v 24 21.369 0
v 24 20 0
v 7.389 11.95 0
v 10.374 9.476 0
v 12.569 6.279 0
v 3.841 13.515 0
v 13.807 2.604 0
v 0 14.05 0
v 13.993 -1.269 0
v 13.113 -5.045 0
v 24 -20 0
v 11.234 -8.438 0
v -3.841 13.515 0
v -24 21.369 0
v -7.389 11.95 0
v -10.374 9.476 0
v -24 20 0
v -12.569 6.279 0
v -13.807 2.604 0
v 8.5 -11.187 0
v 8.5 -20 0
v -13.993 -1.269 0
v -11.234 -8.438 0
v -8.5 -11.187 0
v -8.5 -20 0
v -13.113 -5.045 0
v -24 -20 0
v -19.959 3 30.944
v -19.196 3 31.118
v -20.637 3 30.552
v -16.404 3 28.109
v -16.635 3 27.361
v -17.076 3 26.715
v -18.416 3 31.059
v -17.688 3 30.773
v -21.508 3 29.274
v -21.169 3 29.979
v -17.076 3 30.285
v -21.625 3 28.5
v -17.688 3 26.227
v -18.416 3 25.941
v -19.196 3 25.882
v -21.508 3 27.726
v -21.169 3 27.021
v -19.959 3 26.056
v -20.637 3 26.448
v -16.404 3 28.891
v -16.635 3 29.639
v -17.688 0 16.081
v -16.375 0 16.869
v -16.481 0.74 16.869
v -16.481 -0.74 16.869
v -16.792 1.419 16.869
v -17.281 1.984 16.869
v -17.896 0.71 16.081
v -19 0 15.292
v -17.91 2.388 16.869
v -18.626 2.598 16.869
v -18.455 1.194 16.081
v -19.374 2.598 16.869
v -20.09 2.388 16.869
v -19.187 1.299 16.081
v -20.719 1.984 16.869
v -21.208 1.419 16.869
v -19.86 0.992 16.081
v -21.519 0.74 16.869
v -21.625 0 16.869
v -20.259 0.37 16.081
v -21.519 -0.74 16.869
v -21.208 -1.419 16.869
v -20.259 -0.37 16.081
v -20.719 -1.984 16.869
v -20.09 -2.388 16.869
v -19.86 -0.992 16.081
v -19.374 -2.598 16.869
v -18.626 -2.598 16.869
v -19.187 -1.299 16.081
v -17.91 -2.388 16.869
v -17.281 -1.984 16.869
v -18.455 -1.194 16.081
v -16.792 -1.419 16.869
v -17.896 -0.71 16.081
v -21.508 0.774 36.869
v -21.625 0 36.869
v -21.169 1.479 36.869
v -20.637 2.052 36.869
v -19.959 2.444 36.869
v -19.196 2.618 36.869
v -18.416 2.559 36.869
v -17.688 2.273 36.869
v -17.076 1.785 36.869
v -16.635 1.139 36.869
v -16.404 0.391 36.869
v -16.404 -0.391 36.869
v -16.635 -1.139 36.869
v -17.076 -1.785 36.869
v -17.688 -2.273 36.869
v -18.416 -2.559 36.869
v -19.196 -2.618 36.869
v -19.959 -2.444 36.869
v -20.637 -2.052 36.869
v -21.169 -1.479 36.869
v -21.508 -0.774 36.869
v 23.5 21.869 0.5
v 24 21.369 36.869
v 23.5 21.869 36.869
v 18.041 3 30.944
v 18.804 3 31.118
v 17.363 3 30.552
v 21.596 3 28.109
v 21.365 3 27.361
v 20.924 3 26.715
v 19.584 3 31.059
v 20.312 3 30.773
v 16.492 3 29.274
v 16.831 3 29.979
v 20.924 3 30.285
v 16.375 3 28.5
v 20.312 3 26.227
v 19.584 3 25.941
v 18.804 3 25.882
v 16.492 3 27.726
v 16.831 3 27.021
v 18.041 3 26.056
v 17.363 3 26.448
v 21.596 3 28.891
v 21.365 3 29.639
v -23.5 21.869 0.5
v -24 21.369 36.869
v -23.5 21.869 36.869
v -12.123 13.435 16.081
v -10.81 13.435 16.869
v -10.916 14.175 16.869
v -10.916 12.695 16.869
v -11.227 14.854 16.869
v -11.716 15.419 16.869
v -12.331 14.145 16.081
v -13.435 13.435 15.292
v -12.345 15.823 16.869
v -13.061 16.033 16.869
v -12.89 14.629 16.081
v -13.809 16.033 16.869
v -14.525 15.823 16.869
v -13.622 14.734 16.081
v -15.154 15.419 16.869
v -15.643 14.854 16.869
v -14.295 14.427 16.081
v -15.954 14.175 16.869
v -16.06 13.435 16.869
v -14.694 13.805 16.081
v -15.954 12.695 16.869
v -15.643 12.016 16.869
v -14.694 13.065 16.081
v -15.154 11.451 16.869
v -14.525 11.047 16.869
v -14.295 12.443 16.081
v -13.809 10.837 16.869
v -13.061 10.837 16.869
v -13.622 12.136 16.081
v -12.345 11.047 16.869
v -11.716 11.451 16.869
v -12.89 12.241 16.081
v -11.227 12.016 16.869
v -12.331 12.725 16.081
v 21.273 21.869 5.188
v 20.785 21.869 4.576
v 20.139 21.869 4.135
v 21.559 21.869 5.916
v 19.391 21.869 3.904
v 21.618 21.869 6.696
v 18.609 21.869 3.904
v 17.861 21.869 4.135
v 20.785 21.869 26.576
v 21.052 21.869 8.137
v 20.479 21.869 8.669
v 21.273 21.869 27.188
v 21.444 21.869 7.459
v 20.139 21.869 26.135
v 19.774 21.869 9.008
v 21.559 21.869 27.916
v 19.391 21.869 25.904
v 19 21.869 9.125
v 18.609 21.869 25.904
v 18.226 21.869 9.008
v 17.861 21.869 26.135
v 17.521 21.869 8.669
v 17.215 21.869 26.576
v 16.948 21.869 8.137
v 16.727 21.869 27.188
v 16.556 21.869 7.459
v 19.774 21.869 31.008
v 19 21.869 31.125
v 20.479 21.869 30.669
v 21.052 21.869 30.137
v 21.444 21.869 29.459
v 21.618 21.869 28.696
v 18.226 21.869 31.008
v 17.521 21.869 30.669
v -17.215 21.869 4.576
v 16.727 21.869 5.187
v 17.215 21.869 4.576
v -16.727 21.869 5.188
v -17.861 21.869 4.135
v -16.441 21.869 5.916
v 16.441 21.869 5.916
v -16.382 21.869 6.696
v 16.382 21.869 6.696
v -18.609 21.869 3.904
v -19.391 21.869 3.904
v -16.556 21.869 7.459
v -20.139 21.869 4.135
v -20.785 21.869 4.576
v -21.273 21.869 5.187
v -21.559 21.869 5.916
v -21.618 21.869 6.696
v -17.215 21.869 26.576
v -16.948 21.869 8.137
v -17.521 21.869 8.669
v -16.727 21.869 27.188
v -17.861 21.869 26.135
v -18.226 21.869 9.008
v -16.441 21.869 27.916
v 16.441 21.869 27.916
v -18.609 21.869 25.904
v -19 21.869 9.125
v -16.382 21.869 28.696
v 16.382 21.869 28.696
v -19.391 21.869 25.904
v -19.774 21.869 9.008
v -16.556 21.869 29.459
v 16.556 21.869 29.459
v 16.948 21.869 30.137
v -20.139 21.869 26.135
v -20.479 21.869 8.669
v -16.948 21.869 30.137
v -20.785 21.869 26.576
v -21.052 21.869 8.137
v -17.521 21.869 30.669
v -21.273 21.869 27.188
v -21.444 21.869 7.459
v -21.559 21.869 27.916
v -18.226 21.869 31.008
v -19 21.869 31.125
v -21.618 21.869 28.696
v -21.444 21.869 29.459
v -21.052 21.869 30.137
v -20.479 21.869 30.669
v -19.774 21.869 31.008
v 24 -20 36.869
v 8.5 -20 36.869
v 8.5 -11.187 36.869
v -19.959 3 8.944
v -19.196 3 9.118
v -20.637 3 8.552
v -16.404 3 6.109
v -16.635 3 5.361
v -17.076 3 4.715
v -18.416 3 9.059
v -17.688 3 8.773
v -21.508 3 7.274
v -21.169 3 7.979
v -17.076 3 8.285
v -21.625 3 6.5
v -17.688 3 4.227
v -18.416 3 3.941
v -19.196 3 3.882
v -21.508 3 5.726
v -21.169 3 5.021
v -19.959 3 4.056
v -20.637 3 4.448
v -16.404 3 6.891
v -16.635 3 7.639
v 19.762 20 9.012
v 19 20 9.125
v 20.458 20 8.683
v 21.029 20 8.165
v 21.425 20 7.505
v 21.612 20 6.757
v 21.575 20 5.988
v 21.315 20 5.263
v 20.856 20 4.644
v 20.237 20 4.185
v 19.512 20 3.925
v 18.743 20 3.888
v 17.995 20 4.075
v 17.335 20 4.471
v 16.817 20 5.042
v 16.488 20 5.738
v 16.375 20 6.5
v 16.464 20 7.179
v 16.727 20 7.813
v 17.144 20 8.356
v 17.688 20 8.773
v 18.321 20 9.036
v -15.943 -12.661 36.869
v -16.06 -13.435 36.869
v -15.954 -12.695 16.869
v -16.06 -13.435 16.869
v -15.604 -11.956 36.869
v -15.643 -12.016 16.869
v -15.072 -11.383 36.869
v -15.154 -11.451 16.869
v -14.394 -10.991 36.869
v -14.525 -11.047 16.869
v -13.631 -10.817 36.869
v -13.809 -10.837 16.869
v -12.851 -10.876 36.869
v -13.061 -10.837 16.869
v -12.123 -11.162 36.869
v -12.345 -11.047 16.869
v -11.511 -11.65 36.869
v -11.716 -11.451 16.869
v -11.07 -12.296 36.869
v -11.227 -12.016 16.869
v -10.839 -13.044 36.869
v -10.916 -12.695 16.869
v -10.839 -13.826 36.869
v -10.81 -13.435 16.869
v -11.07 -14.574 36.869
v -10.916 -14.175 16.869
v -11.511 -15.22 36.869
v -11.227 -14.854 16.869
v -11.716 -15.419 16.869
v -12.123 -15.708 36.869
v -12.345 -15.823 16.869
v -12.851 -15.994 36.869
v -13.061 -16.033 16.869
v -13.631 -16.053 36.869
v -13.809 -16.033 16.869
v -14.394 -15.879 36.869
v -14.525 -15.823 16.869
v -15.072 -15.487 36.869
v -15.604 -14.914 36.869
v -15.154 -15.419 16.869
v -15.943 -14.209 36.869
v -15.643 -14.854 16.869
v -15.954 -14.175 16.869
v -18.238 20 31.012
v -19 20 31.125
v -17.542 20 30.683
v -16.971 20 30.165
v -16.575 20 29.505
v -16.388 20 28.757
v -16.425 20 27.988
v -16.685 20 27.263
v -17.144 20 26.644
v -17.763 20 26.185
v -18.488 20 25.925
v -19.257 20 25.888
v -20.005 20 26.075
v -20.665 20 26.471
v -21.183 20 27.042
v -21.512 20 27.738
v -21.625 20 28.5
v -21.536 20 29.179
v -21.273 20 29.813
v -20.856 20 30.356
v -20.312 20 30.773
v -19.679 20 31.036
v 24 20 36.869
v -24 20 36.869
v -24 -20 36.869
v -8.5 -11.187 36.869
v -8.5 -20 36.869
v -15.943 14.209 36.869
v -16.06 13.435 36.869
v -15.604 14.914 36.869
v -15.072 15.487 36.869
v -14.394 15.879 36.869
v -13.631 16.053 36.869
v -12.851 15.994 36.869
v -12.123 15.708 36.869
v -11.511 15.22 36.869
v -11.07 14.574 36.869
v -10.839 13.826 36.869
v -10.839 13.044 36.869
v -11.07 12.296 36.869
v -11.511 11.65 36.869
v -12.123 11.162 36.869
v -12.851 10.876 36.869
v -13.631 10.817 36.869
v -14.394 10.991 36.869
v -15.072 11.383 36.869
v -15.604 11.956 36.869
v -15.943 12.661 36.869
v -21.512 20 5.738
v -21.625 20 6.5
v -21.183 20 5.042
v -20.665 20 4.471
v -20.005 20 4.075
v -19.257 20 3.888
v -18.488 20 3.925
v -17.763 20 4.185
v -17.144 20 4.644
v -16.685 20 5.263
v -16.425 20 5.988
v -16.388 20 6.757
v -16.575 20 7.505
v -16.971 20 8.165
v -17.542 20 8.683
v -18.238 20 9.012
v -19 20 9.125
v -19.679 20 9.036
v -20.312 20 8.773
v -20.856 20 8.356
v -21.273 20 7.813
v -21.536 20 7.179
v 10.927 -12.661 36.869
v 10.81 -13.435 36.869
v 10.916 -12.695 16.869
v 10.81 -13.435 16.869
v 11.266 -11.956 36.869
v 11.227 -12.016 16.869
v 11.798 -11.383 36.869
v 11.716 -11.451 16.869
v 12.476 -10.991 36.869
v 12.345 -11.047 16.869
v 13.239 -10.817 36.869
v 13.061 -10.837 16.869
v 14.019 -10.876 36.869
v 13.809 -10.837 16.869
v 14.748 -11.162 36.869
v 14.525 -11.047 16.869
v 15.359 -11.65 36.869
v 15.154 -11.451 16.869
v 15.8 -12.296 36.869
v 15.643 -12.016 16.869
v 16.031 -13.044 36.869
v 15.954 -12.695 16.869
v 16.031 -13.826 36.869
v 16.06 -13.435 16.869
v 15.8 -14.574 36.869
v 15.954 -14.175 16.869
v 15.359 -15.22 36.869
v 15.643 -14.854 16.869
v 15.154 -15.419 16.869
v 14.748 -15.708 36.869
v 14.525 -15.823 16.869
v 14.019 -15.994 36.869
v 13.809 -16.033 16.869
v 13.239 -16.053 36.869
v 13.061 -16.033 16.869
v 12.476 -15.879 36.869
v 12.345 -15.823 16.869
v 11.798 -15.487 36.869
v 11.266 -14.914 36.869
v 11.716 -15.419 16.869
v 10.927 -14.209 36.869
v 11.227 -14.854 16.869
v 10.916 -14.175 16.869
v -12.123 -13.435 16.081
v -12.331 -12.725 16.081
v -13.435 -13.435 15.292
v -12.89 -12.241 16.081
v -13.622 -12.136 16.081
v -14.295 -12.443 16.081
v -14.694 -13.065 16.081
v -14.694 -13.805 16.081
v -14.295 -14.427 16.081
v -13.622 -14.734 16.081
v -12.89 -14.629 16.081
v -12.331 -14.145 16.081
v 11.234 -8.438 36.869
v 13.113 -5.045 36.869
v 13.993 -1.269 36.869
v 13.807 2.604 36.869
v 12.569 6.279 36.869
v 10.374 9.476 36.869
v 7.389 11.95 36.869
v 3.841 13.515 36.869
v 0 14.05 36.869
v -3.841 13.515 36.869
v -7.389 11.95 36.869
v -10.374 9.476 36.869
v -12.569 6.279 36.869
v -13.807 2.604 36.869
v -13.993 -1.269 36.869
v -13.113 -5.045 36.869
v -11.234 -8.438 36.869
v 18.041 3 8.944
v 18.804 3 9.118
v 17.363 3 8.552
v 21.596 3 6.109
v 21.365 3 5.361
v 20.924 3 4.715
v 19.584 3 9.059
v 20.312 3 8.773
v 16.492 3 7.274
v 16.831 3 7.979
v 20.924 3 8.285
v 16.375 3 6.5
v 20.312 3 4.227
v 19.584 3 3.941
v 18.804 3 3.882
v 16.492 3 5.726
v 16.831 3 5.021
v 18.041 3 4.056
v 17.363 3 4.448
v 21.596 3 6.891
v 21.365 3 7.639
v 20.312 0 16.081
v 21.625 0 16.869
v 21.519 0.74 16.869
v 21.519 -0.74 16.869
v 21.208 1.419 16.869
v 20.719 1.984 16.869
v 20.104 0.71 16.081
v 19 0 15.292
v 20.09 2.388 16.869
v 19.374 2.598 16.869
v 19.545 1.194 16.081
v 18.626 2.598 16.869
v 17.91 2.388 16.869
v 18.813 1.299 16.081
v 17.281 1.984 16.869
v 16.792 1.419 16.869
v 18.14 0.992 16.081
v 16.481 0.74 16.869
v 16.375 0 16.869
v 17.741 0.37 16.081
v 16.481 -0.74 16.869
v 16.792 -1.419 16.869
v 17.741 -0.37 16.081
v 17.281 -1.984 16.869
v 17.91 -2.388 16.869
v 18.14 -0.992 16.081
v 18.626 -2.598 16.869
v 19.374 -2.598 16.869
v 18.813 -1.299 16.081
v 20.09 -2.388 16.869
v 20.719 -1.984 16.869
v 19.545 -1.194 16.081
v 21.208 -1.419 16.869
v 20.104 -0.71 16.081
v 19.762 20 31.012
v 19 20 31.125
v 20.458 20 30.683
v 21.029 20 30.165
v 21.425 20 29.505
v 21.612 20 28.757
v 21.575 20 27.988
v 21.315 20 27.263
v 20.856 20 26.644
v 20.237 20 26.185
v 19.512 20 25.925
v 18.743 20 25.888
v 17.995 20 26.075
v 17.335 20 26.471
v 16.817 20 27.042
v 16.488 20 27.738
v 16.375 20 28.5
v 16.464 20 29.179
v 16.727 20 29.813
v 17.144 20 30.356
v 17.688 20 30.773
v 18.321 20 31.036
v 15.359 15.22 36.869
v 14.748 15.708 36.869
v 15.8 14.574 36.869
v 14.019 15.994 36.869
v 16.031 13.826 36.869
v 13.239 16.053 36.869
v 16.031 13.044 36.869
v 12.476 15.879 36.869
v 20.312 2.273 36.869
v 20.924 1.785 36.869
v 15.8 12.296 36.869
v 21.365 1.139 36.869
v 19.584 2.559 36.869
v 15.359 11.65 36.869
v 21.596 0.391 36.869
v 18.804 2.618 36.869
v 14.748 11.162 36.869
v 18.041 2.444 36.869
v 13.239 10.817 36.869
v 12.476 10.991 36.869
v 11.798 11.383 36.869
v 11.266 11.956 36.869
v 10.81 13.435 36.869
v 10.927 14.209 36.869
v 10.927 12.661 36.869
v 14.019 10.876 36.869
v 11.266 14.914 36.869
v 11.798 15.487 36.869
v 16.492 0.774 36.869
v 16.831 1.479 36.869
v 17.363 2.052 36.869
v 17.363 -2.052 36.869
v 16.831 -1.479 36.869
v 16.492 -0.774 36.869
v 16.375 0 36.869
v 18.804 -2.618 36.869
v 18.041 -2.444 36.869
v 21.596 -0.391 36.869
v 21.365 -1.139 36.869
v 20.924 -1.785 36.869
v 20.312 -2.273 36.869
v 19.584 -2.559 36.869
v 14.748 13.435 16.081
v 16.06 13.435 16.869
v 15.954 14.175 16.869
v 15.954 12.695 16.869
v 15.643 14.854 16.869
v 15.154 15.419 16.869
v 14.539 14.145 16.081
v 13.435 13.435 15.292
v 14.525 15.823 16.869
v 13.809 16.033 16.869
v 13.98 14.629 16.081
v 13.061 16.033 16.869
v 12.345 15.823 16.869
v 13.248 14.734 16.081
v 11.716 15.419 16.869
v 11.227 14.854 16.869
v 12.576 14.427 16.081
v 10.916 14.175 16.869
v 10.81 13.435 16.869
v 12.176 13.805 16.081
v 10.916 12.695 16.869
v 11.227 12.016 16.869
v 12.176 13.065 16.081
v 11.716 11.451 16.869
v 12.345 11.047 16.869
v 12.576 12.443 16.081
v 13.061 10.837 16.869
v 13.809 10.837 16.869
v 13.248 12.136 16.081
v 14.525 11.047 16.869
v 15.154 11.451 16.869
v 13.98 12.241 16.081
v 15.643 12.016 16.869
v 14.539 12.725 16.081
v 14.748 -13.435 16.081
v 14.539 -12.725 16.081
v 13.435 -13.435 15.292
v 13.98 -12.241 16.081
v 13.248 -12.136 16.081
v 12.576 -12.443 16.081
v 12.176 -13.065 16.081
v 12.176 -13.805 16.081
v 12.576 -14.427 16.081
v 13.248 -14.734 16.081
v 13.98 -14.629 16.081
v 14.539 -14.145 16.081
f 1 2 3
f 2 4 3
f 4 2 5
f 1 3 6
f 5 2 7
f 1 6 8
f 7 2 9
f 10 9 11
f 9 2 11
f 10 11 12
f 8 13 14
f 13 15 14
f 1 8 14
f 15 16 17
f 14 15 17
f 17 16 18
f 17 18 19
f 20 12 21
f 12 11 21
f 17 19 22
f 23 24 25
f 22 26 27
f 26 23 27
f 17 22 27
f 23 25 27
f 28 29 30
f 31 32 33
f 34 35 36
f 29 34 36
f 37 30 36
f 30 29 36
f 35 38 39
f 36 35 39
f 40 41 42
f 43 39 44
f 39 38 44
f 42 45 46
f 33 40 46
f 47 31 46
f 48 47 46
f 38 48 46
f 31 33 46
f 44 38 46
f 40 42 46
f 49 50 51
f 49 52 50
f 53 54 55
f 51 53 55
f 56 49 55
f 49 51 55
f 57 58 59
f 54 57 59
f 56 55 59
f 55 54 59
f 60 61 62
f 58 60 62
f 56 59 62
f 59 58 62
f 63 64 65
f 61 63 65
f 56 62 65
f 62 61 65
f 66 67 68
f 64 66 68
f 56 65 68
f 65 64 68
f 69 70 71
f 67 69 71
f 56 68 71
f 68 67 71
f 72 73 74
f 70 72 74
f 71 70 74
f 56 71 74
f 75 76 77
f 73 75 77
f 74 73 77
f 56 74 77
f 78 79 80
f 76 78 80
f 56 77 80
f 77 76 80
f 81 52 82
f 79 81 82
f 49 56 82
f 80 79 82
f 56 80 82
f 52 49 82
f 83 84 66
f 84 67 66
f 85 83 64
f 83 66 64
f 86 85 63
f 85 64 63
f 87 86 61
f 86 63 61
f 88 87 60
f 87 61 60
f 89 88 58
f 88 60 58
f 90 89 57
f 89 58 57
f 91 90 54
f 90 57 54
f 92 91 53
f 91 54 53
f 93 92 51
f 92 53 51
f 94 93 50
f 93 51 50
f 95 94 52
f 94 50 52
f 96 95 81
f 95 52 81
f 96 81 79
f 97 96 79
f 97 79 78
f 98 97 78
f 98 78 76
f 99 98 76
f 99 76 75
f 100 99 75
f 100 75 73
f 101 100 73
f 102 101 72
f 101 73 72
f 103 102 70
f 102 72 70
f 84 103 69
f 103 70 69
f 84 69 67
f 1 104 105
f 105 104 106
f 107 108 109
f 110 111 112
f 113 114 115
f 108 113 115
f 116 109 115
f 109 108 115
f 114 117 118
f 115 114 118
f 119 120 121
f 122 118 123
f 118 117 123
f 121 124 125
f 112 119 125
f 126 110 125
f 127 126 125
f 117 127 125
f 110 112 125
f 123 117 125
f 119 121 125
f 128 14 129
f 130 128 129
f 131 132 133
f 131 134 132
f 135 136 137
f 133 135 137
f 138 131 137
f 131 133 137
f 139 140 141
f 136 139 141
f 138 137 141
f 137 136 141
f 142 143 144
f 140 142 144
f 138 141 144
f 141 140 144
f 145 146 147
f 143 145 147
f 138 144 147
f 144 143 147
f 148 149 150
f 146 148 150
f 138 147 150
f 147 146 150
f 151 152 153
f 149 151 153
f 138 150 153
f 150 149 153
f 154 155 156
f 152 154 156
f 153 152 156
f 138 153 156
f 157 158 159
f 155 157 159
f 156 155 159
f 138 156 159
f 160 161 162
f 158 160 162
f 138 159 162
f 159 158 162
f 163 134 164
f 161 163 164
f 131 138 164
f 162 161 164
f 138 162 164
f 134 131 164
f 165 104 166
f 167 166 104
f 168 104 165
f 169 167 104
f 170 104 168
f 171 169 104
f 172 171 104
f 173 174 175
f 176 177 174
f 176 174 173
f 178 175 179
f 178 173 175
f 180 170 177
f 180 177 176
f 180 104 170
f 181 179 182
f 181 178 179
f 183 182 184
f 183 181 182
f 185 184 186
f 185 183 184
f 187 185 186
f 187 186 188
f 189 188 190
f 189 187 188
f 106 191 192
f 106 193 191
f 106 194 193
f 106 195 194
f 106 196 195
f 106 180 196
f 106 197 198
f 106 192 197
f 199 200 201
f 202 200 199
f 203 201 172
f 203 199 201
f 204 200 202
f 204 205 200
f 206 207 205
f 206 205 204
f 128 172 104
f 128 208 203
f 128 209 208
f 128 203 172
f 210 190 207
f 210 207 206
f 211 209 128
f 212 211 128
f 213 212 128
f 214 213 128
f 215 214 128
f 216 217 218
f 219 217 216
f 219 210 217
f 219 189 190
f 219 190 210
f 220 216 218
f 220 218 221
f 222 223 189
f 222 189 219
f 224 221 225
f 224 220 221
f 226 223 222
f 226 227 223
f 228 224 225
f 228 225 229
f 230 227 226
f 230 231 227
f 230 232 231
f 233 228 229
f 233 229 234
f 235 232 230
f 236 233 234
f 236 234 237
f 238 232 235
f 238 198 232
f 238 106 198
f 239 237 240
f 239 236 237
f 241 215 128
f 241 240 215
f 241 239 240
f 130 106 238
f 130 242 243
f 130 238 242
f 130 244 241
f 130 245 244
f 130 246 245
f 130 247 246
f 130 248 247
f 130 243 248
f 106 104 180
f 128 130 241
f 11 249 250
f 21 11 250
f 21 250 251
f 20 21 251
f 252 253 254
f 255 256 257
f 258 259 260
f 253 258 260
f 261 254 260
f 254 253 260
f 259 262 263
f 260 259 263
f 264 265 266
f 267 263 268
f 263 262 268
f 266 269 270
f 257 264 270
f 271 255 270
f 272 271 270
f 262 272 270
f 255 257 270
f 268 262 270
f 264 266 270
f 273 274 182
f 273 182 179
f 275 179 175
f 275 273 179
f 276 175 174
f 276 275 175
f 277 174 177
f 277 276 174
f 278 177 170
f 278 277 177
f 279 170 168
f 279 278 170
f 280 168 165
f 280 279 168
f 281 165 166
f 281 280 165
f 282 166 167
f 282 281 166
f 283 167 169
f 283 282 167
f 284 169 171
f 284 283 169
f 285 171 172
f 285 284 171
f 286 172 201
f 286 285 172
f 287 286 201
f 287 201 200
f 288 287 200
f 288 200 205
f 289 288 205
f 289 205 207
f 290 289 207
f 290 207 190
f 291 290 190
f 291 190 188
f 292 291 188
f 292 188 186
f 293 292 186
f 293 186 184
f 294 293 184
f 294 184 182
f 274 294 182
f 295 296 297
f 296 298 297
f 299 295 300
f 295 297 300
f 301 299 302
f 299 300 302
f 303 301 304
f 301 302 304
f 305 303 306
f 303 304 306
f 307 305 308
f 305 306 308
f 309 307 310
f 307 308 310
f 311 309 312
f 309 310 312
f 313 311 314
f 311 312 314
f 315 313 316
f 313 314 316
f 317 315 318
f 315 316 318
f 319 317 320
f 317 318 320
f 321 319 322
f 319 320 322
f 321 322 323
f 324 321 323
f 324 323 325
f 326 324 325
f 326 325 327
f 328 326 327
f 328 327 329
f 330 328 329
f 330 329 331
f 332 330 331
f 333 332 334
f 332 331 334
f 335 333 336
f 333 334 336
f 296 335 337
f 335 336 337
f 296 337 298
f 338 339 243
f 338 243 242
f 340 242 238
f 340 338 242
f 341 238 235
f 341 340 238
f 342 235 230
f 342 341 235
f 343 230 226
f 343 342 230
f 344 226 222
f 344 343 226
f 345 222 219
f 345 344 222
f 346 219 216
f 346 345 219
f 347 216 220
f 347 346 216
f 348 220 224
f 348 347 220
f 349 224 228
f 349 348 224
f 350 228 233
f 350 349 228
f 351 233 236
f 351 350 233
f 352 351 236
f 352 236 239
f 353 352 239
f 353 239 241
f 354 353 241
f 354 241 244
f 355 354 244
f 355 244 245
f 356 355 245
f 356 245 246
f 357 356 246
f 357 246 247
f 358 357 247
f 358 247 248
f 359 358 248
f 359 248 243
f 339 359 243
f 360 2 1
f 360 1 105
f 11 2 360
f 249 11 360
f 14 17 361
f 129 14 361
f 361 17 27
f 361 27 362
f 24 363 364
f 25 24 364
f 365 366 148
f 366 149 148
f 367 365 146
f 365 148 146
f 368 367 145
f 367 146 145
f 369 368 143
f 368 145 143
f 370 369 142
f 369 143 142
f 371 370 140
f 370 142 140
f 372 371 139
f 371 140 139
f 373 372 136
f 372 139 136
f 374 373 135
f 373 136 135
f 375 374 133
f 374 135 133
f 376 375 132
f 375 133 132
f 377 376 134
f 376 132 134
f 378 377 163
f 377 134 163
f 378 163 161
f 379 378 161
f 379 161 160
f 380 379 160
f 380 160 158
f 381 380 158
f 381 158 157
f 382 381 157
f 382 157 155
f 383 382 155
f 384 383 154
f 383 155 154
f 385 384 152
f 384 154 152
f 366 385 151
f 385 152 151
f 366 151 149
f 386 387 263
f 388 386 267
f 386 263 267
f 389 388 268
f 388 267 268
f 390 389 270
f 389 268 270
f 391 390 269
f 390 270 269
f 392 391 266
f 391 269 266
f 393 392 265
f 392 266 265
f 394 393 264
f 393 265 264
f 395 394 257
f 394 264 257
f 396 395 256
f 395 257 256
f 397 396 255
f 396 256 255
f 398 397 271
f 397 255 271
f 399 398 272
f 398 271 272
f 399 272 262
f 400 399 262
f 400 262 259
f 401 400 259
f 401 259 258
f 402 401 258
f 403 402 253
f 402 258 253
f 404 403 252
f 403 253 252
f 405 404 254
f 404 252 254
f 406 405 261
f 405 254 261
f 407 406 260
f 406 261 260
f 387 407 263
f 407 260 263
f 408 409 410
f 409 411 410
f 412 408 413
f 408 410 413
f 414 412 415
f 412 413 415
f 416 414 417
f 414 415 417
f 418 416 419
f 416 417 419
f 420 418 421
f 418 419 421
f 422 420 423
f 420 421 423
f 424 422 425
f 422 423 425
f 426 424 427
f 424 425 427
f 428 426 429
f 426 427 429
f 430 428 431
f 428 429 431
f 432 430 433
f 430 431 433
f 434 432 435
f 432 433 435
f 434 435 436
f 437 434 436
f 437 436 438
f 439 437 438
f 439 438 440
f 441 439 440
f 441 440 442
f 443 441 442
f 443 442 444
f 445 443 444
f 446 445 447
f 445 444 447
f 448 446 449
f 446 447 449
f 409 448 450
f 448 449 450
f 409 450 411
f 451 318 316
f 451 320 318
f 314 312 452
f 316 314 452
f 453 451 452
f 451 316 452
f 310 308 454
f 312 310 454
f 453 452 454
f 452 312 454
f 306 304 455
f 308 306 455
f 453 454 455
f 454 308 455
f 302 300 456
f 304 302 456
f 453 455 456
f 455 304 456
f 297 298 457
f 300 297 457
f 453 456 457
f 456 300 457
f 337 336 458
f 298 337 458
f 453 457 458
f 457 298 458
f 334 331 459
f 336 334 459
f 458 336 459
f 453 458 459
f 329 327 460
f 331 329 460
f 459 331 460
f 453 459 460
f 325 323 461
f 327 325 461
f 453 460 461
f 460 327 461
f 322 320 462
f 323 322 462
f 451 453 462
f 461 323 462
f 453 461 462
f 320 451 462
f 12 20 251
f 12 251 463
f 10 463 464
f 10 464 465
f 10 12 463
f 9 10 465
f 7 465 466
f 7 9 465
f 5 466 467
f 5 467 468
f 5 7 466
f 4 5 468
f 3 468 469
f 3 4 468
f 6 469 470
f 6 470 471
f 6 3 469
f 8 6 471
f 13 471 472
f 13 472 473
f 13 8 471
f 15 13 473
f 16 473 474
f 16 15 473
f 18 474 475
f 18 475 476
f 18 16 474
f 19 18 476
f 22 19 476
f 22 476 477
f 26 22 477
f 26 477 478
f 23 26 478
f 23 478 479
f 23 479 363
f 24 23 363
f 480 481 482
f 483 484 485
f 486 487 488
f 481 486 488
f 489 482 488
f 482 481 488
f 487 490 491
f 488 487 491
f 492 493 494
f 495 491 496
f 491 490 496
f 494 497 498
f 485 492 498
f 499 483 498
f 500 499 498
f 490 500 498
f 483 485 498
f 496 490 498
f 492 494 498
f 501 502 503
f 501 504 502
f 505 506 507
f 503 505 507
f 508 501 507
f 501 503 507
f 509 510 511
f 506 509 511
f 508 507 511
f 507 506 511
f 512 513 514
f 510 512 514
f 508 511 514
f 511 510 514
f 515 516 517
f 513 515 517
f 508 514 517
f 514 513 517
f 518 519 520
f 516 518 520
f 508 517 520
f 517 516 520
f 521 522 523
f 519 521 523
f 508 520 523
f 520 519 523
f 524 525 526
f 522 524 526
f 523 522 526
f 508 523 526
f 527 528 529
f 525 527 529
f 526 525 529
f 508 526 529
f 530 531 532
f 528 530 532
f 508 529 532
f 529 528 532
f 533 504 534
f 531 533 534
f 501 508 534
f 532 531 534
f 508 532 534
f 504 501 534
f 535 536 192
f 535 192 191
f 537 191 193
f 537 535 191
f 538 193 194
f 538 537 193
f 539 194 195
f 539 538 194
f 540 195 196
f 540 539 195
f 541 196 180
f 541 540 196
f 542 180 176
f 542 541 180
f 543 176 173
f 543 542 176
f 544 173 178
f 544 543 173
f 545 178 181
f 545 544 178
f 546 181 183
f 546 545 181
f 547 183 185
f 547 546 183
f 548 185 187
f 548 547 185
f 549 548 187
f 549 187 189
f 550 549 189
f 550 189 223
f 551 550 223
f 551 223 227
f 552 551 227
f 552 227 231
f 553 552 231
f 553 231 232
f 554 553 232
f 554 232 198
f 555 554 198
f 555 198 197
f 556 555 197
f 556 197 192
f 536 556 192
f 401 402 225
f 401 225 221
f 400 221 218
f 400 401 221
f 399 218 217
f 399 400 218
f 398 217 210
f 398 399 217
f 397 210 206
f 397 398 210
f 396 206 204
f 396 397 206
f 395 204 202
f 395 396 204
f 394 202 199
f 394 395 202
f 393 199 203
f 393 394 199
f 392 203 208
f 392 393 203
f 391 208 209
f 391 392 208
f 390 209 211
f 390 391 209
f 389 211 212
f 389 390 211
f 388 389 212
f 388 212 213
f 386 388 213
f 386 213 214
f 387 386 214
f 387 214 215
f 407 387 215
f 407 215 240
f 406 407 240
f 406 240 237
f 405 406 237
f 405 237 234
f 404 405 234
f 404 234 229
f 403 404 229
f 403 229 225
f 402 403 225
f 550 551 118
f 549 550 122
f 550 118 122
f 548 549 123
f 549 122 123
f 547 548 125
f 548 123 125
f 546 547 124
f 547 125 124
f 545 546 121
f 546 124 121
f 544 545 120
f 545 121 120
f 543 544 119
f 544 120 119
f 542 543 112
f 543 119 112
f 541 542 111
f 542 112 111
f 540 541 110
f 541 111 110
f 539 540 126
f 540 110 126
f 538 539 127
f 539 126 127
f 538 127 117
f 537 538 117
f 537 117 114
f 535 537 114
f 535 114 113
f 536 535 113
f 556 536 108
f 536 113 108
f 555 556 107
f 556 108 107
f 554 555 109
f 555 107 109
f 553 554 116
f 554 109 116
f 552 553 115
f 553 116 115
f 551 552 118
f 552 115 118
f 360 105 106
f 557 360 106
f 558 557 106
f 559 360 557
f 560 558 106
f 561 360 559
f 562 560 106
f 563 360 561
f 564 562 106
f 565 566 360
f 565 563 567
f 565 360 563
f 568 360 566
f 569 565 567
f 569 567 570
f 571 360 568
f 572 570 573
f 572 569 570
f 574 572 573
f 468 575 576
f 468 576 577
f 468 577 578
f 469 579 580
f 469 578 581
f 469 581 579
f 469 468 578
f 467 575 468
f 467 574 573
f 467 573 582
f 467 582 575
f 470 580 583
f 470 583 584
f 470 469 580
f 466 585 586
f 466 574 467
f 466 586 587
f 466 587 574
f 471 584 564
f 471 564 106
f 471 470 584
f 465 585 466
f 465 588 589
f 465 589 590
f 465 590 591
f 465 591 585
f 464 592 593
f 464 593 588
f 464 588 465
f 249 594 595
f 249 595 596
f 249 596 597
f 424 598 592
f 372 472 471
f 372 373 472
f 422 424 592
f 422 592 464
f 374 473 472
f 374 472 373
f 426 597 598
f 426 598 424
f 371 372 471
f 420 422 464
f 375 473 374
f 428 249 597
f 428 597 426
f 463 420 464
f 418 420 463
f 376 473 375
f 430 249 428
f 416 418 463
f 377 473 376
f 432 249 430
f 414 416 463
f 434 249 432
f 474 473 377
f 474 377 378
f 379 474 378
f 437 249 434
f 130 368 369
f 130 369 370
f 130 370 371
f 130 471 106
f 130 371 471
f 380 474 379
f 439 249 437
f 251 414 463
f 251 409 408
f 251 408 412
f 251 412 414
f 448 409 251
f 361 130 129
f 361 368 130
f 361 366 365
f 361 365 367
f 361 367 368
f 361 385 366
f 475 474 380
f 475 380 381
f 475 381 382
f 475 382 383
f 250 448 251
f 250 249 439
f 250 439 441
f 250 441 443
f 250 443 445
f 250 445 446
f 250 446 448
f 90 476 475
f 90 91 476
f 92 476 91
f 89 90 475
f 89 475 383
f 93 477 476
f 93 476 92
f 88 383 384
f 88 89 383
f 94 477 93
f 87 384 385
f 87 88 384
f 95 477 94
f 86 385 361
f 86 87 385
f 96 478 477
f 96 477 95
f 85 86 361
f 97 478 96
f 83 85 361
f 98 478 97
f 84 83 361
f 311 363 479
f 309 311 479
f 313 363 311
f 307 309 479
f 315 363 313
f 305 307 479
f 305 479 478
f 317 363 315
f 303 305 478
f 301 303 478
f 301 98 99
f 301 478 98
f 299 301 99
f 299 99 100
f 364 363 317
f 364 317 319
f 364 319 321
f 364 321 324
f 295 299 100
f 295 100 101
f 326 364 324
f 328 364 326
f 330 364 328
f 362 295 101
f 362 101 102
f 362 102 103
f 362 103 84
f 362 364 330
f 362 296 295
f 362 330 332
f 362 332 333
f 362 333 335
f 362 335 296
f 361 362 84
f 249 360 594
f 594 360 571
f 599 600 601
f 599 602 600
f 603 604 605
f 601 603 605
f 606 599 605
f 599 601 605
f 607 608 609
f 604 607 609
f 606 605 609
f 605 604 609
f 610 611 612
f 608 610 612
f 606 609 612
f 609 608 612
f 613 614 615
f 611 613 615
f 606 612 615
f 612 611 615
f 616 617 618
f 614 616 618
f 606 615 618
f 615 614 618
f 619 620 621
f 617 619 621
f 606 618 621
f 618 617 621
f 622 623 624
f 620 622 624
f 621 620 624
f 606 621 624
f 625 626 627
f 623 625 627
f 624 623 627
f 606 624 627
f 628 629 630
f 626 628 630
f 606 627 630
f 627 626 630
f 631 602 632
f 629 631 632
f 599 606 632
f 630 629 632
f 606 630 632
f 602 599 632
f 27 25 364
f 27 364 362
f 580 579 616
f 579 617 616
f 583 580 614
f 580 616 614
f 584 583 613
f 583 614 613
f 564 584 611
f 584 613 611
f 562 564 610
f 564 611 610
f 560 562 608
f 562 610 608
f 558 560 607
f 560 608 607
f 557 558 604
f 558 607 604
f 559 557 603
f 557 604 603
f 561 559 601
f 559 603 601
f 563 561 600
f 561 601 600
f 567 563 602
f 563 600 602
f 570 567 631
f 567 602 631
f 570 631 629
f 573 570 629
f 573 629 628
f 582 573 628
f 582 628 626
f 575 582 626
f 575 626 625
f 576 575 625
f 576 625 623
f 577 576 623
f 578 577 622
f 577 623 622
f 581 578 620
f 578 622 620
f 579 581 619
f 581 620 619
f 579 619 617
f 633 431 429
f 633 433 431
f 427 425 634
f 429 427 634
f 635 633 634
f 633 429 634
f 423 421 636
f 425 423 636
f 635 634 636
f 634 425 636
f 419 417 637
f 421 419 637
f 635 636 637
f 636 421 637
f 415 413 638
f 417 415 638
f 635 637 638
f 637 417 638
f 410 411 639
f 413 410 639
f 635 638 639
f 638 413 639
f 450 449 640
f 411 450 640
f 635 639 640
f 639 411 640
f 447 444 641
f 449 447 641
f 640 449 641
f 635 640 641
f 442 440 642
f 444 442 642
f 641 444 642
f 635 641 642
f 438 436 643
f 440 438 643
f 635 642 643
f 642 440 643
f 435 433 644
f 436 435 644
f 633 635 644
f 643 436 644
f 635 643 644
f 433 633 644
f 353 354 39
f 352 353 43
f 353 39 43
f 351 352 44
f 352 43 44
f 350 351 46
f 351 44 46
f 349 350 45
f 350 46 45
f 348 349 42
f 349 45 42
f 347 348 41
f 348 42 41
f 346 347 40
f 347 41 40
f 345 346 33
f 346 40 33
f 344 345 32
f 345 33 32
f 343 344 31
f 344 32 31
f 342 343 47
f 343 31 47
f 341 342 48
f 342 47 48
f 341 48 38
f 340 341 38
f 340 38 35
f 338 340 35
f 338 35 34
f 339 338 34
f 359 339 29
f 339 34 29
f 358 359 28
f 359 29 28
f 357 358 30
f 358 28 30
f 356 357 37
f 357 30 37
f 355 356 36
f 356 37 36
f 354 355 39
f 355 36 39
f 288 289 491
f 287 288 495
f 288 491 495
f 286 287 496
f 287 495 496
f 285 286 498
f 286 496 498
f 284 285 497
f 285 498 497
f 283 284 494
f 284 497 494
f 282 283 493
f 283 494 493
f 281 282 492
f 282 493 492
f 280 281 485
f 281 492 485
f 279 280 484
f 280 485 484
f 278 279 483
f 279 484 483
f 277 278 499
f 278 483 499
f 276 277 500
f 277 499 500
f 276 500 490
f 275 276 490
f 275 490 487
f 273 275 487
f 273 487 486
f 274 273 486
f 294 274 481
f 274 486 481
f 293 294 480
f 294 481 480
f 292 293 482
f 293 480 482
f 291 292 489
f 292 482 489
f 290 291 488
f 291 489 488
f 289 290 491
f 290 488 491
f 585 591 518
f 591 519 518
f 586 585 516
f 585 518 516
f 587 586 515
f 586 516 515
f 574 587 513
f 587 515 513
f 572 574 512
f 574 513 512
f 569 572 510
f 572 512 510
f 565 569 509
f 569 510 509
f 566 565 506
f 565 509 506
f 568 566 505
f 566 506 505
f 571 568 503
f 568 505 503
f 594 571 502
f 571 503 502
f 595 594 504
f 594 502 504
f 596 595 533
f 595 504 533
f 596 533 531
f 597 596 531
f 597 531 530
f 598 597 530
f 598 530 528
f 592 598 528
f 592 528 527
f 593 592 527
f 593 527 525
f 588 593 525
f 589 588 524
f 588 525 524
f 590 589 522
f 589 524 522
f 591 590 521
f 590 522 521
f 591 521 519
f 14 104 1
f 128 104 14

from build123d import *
from build123d.topology import SkipClean

# Parameters (mm, degrees)
EXTRUSION1_DEPTH = 36.869499995
THREAD6_D        = 5.25
THREAD6_DEPTH    = 20
THREAD6_TIP      = 1.577259125
THREAD10_D       = 5.25
THREAD10_DEPTH   = 17
SKETCH6_W        = 48
SKETCH6_H        = 36.869499995
SKETCH6_R        = 2.625
EXTRUSION2_DEPTH = 1.869499995
CHAMFER2_SIZE    = 0.5


with BuildPart() as part:
    # Sketch1 → Extrusion1 (new body)
    with BuildSketch(Plane.XY):
        with BuildLine():
            Line((-24, 20), (24, 20))
            Line((24, 20), (24, -20))
            Line((24, -20), (8.5, -20))
            Line((8.5, -20), (8.5, -11.187157816))
            ThreePointArc((8.5, -11.187157816), (0, 14.05), (-8.5, -11.187157816))
            Line((-8.5, -11.187157816), (-8.5, -20))
            Line((-8.5, -20), (-24, -20))
            Line((-24, -20), (-24, 20))
        make_face()
    extrude(amount=EXTRUSION1_DEPTH)

    # Thread6
    with Locations(Plane.XY.offset(36.869499995)):
        with Locations((-19, 0), (-13.435028843, -13.435028843), (-13.435028843, 13.435028843), (13.435028843, 13.435028843), (19, 0), (13.435028843, -13.435028843)):
            Hole(THREAD6_D / 2, depth=THREAD6_DEPTH)
            with Locations((0, 0, -(THREAD6_DEPTH + THREAD6_TIP / 2))):  # 118° drill point
                Cone(0, THREAD6_D / 2, THREAD6_TIP, mode=Mode.SUBTRACT)

    # Thread10
    with Locations(Plane(origin=(0, 20, 0), x_dir=(1, 0, 0), z_dir=(0, 1, 0))):
        with Locations((-19, -6.5), (19, -6.5), (-19, -28.5), (19, -28.5)):
            Hole(THREAD10_D / 2, depth=THREAD10_DEPTH)

    # Sketch6 → Extrusion2 (add)
    with SkipClean():  # the faces are left unmerged after this step: merging them gives an invalid solid
        with BuildSketch(Plane(origin=(0, 20, 0), x_dir=(-1, 0, 0), z_dir=(0, 1, 0))):
            with Locations((0, 18.434749998)):
                Rectangle(SKETCH6_W, SKETCH6_H)
            with Locations(Location((19, 28.5, 0), (0, 0, 90))):
                Circle(SKETCH6_R, mode=Mode.SUBTRACT)
            with Locations(Location((19, 6.5, 0), (0, 0, 90))):
                Circle(SKETCH6_R, mode=Mode.SUBTRACT)
            with Locations(Location((-19, 6.5, 0), (0, 0, 90))):
                Circle(SKETCH6_R, mode=Mode.SUBTRACT)
            with Locations(Location((-19, 28.5, 0), (0, 0, 90))):
                Circle(SKETCH6_R, mode=Mode.SUBTRACT)
        extrude(amount=EXTRUSION2_DEPTH)

    # Chamfer2
    chamfer2_edges = [part.edges().sort_by_distance(p)[0] for p in [
        (24, 21.869499995, 18.434749997),
        (0, 21.869499995, 0),
        (-24, 21.869499995, 18.434749997),
    ]]
    chamfer(chamfer2_edges, length=CHAMFER2_SIZE)


solid = part.part
